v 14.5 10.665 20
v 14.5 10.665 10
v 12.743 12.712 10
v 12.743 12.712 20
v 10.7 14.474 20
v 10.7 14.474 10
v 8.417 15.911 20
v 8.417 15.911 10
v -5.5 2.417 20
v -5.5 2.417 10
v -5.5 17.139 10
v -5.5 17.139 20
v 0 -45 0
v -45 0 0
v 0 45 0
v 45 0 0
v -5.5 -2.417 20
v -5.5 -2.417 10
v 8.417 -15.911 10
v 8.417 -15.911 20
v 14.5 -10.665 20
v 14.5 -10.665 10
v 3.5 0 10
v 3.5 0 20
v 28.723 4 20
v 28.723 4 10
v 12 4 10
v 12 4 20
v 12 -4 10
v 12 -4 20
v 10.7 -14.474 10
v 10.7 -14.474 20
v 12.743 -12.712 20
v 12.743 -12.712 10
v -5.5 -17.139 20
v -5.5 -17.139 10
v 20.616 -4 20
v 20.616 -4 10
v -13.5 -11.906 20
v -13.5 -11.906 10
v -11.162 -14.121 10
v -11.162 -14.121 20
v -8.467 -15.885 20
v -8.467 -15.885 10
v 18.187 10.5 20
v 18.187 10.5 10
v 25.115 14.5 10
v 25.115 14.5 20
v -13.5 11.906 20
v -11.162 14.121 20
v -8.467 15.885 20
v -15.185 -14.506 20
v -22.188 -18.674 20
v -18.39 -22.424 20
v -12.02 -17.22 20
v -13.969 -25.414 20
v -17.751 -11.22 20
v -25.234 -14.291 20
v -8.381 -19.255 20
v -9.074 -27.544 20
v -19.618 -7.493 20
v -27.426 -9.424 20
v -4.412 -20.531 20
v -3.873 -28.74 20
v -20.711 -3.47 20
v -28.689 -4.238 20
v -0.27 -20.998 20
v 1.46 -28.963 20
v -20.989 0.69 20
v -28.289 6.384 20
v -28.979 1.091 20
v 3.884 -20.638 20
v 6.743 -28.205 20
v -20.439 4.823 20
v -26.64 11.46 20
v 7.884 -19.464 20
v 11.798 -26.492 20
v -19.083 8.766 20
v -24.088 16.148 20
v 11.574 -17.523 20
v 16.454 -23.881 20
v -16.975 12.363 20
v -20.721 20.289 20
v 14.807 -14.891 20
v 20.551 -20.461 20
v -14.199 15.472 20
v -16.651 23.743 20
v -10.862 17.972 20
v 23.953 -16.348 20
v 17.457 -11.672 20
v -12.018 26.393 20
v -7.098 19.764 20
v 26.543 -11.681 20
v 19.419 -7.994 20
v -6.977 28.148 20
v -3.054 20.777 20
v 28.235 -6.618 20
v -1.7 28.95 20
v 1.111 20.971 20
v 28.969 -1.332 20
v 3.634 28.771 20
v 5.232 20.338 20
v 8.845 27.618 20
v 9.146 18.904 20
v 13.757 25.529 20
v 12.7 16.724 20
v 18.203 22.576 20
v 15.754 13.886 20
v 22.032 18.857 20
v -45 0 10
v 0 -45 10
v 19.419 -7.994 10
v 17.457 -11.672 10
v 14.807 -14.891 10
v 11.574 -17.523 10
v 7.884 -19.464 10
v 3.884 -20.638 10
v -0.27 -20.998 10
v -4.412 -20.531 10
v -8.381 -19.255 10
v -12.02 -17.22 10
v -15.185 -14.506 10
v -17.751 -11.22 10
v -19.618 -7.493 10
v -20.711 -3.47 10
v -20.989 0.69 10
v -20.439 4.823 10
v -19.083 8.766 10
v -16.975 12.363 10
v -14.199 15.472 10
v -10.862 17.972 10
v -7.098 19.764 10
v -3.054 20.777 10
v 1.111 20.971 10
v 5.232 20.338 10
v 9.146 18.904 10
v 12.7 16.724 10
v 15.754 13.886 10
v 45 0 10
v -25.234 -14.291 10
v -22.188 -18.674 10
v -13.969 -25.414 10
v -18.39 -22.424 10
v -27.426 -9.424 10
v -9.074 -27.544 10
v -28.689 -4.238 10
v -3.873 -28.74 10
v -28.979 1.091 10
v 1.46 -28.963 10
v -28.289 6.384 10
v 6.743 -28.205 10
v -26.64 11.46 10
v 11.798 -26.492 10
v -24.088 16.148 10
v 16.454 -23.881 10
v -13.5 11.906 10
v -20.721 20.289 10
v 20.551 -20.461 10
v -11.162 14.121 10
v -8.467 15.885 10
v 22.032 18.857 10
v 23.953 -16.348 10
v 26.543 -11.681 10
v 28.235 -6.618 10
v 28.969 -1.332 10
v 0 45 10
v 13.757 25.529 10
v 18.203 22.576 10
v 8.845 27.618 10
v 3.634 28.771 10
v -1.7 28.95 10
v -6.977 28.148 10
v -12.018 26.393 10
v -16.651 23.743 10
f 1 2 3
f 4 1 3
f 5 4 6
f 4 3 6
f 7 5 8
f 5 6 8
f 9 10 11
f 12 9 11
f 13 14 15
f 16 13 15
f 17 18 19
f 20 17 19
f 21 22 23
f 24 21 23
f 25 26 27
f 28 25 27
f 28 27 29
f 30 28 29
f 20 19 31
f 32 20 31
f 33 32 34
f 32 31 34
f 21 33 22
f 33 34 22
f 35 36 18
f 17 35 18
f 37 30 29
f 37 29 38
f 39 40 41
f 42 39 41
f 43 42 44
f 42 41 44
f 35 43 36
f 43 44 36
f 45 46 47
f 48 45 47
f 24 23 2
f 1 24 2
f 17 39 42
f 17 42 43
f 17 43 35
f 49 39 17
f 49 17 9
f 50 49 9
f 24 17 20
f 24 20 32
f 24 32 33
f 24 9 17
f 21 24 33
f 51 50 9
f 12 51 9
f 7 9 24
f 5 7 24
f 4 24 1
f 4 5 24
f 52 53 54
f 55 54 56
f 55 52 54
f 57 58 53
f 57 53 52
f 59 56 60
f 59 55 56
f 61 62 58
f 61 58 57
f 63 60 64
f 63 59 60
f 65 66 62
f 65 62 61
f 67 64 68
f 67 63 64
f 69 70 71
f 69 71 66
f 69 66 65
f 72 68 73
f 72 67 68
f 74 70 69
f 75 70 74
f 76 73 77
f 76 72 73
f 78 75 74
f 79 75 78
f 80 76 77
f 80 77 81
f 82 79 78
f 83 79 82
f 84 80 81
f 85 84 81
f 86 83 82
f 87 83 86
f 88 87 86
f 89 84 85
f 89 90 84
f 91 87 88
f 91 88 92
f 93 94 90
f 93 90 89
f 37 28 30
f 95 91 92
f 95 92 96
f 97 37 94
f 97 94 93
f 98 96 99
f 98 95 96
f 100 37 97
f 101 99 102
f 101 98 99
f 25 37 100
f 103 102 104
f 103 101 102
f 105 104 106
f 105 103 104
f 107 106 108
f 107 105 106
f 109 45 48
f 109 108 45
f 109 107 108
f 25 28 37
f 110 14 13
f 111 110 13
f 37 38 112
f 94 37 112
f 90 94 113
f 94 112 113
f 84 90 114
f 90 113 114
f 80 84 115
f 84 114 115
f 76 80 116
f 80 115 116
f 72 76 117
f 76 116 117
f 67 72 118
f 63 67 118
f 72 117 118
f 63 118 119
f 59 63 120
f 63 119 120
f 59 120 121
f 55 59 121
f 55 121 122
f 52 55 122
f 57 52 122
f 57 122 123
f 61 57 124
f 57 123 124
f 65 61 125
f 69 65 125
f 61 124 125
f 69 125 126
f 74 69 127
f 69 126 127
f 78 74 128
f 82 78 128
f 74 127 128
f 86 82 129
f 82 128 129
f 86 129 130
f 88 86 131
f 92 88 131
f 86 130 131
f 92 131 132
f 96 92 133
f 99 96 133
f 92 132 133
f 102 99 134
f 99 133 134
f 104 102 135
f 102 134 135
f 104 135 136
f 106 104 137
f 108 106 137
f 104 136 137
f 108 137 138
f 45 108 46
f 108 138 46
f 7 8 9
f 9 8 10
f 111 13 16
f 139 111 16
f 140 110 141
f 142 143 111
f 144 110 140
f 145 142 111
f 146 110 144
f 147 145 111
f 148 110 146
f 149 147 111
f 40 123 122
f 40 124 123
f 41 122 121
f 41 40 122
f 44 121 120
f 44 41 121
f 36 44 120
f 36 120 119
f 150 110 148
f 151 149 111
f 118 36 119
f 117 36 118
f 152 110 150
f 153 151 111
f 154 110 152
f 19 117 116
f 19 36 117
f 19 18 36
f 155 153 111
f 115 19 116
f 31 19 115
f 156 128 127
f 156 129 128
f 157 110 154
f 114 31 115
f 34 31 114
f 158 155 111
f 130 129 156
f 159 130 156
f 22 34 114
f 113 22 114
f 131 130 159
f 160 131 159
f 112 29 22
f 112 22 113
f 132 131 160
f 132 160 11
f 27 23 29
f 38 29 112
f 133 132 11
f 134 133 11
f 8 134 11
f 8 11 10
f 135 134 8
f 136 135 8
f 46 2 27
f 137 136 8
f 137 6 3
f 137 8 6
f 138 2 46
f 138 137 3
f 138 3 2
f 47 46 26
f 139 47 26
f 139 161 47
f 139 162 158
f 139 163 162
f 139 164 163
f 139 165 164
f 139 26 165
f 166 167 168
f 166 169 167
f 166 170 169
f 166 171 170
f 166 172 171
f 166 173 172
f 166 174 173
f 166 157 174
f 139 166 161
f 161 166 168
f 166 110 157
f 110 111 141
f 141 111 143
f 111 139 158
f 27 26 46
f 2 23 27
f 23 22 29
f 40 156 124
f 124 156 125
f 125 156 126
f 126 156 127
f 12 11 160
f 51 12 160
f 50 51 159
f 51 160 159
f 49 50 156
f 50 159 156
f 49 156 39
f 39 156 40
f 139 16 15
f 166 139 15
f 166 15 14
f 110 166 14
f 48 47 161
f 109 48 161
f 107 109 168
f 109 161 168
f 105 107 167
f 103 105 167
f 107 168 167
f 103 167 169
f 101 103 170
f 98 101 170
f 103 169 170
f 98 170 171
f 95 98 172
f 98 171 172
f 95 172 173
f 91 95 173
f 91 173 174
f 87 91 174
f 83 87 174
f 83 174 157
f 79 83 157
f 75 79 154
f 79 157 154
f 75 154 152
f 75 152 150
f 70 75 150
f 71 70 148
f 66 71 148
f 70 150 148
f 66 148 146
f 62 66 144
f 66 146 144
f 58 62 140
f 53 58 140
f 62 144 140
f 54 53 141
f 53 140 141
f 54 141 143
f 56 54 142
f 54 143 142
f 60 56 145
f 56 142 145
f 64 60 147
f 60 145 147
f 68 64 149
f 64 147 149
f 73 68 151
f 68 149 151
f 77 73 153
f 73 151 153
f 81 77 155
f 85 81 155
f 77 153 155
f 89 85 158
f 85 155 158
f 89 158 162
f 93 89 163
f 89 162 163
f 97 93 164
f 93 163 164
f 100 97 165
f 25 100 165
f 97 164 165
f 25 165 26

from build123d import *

# Parameters (mm, degrees)
F1_DEPTH = 10
F3_DEPTH = 10
F5_DEPTH = 10


with BuildPart() as f1:
    # F0 (on Top) → F1 (new body)
    with BuildSketch(Plane.XY):
        Polygon((45, 0), (0, 45), (-45, 0), (0, -45), align=None)
    extrude(amount=F1_DEPTH)

    # F2 (on face) → F3 (join)
    with BuildSketch(Plane.XY.offset(10)):
        with BuildLine():
            Line((18.186533, 10.5), (25.114737, 14.5))
            ThreePointArc((25.114737, 14.5), (-27.425954, -9.42428), (28.722813, 4))
            Line((28.722813, 4), (12, 4))
            Line((12, 4), (12, -4))
            Line((12, -4), (20.615528, -4))
            ThreePointArc((20.615528, -4), (-20.71141, -3.469511), (18.186533, 10.5))
        make_face()
    extrude(amount=F3_DEPTH)

    # F4 (on face) → F5 (join)
    with BuildSketch(Plane.XY.offset(10)):
        with BuildLine():
            Line((3.5, 0), (14.5, 10.665365))
            ThreePointArc((14.5, 10.665365), (11.754954, 13.631619), (8.417301, 15.910658))
            Line((8.417301, 15.910658), (-5.5, 2.416741))
            Line((-5.5, 2.416741), (-5.5, -2.416741))
            Line((-5.5, -2.416741), (8.417301, -15.910658))
            ThreePointArc((8.417301, -15.910658), (11.754954, -13.631619), (14.5, -10.665365))
            Line((14.5, -10.665365), (3.5, 0))
        make_face()
        with BuildLine():
            Line((-5.5, -2.416741), (-5.5, 2.416741))
            Line((-5.5, 2.416741), (-5.5, 17.139137))
            ThreePointArc((-5.5, 17.139137), (-9.853768, 15.063308), (-13.5, 11.905881))
            Line((-13.5, 11.905881), (-13.5, -11.905881))
            ThreePointArc((-13.5, -11.905881), (-9.853768, -15.063308), (-5.5, -17.139137))
            Line((-5.5, -17.139137), (-5.5, -2.416741))
        make_face()
    extrude(amount=F5_DEPTH)


solid = f1.part
